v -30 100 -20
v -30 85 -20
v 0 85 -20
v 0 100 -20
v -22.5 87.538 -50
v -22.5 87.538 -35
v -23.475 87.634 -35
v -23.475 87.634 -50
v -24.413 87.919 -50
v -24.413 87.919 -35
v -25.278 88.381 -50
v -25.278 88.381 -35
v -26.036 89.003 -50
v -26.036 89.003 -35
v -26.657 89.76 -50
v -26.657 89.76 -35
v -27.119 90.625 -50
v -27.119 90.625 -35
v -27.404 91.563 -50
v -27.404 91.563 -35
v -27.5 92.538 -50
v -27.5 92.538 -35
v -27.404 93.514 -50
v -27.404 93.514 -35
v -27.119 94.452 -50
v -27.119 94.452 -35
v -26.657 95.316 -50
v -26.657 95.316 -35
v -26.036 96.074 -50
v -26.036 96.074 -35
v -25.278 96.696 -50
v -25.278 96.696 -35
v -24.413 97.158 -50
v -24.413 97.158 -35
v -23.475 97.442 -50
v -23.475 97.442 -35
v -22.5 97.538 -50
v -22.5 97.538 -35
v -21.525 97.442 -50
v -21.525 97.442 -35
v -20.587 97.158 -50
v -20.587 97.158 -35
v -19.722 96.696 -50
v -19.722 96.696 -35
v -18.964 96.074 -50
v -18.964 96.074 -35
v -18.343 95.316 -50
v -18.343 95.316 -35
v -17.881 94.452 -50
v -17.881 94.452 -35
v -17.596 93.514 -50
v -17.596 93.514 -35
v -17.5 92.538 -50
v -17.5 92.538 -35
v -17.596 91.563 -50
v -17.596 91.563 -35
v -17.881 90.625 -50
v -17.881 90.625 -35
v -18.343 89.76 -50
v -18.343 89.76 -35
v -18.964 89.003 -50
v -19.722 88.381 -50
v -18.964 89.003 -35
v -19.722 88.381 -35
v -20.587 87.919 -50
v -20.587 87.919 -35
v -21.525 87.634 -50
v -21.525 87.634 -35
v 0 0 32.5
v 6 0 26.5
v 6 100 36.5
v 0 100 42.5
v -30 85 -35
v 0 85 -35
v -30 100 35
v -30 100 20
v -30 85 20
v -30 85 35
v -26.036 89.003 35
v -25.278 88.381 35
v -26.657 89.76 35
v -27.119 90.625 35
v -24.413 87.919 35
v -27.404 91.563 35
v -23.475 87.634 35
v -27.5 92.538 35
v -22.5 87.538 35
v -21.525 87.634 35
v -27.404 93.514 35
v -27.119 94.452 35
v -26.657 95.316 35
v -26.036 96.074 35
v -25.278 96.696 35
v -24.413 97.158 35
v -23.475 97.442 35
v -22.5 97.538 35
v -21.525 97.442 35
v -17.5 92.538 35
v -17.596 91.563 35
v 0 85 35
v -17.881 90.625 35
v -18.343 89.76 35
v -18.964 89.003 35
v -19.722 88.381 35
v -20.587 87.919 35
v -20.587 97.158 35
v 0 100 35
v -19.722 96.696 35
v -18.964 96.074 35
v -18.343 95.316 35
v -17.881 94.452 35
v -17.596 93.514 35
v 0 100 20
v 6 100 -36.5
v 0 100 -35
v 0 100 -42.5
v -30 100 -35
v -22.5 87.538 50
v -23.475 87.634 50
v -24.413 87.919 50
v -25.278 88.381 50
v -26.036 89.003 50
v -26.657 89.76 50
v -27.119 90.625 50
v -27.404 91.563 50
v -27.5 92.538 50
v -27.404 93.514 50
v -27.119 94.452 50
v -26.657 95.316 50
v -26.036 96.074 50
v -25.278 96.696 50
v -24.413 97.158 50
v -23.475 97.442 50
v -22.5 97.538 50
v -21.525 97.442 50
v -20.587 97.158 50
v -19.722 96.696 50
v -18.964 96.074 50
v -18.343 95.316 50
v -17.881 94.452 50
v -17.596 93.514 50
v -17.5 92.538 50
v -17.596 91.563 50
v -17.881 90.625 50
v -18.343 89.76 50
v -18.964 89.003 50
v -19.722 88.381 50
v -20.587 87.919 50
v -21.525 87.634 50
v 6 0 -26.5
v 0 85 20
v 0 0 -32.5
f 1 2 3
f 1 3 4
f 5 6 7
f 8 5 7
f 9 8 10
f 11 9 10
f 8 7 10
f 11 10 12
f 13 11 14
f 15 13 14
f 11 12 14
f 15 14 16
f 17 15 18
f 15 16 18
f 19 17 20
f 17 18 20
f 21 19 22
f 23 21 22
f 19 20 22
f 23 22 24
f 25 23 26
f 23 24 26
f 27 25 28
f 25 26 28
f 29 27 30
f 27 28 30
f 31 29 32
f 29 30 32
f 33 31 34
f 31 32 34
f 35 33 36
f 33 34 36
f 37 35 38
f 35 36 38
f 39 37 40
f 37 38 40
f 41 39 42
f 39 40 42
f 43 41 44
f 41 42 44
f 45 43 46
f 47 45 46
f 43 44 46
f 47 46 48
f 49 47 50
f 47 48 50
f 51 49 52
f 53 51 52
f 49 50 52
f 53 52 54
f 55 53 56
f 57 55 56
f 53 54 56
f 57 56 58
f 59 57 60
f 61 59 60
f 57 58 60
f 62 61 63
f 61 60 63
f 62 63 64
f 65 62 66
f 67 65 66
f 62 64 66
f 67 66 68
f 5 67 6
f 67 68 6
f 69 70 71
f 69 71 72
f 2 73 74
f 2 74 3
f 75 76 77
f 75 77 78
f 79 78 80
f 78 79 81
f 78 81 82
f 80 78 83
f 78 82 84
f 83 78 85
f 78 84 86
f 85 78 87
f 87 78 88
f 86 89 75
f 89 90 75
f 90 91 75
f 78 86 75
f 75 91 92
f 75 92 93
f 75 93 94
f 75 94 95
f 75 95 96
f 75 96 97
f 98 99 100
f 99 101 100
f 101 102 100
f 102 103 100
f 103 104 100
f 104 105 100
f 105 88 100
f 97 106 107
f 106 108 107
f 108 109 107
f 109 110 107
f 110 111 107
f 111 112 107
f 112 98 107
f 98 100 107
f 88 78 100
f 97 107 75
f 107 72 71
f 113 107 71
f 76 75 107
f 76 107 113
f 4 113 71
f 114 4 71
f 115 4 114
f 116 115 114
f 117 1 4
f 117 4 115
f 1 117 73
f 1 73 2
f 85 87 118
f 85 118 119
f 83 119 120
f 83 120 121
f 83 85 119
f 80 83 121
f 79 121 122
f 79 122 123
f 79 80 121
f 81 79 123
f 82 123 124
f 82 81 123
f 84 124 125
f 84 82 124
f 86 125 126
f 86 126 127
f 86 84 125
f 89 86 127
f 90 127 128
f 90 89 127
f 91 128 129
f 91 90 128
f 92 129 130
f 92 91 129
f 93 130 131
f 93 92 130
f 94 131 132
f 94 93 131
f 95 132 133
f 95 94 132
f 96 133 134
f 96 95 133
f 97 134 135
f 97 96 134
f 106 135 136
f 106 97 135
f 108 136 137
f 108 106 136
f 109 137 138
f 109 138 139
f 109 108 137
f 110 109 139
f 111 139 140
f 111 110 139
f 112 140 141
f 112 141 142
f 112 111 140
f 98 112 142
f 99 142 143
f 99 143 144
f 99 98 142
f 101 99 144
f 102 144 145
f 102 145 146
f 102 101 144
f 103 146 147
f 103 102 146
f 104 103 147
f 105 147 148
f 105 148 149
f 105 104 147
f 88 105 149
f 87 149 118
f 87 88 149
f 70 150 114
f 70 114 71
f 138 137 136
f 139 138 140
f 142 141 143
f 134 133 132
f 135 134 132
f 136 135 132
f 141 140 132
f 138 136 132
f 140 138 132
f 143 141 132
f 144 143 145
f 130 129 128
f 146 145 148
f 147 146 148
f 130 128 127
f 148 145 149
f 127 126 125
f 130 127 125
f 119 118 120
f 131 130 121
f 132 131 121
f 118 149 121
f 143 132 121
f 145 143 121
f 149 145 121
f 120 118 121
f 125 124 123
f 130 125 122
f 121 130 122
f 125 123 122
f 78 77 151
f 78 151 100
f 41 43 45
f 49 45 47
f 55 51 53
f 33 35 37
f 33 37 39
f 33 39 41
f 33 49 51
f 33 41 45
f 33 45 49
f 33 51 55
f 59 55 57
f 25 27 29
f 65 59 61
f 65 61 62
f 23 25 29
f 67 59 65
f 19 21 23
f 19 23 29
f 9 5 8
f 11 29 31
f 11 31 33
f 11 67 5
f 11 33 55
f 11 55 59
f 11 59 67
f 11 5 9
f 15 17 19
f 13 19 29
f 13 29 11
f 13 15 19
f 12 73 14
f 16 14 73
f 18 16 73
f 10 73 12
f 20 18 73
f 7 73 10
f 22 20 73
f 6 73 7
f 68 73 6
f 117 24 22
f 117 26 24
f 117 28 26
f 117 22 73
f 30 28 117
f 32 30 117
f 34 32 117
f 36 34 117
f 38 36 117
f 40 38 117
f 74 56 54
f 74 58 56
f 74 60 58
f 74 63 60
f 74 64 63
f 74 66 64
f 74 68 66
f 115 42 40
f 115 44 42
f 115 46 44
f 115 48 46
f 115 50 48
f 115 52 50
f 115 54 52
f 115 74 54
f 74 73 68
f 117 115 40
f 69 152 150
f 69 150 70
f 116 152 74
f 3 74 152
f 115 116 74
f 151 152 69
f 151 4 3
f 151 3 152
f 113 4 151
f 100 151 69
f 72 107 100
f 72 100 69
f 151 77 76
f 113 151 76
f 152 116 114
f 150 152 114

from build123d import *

# Parameters (mm, degrees)
SALIENTE_EXTRUIR1_DEPTH = 6
CROQUIS3_W              = 15
CROQUIS3_H              = 15
SALIENTE_EXTRUIR2_DEPTH = 30
CROQUIS4_R              = 5
SALIENTE_EXTRUIR3_DEPTH = 15


with BuildPart() as part:
    # Croquis1 → Saliente-Extruir1 (new body)
    with BuildSketch(Plane(origin=(0, 0, 0), x_dir=(0, 0, -1), z_dir=(1, 0, 0))):
        Polygon((32.5, 0), (-32.5, 0), (-42.5, 100), (42.5, 100), align=None)
    extrude(amount=SALIENTE_EXTRUIR1_DEPTH)

    # Croquis3 → Saliente-Extruir2 (add)
    with BuildSketch(Plane.ZY):
        with Locations((-27.5, 92.5)):
            Rectangle(CROQUIS3_W, CROQUIS3_H)
        with Locations((27.5, 92.5)):
            Rectangle(CROQUIS3_W, CROQUIS3_H)
    extrude(amount=SALIENTE_EXTRUIR2_DEPTH)

    # Croquis4 → Saliente-Extruir3 (add)
    with BuildSketch(Plane(origin=(0, 0, -35), x_dir=(-1, 0, 0), z_dir=(0, 0, -1))):
        with Locations(Location((22.5, 92.538258804, 0), (0, 0, 270))):
            Circle(CROQUIS4_R)
    saliente_extruir3 = extrude(amount=SALIENTE_EXTRUIR3_DEPTH)

    # Simetría1: Saliente-Extruir3 across plane
    add(saliente_extruir3.mirror(Plane.XY))

    # Cortar-Barrer1: sweep along a curve in space
    with BuildLine() as cortar_barrer1_path:
        Line((6, 100, 42.5), (6, 0, 32.5))
    # Croquis7 → Cortar-Barrer1 (sweep, cut)
    with BuildSketch(Plane(origin=(0, 100, 0), x_dir=(1, 0, 0), z_dir=(0, 1, 0))):
        Polygon((0, -42.5), (6, -36.5), (6, -42.5), align=None)
    sweep(path=cortar_barrer1_path.line, mode=Mode.SUBTRACT)

    # Cortar-Barrer2: sweep along a curve in space
    with BuildLine() as cortar_barrer2_path:
        Line((6, 0, -32.5), (6, 100, -42.5))
    # Croquis8 → Cortar-Barrer2 (sweep, cut)
    with BuildSketch(Plane(origin=(0, 100, 0), x_dir=(1, 0, 0), z_dir=(0, 1, 0))):
        Polygon((0, 42.5), (6, 36.5), (6, 42.5), align=None)
    sweep(path=cortar_barrer2_path.line, mode=Mode.SUBTRACT)


solid = part.part
